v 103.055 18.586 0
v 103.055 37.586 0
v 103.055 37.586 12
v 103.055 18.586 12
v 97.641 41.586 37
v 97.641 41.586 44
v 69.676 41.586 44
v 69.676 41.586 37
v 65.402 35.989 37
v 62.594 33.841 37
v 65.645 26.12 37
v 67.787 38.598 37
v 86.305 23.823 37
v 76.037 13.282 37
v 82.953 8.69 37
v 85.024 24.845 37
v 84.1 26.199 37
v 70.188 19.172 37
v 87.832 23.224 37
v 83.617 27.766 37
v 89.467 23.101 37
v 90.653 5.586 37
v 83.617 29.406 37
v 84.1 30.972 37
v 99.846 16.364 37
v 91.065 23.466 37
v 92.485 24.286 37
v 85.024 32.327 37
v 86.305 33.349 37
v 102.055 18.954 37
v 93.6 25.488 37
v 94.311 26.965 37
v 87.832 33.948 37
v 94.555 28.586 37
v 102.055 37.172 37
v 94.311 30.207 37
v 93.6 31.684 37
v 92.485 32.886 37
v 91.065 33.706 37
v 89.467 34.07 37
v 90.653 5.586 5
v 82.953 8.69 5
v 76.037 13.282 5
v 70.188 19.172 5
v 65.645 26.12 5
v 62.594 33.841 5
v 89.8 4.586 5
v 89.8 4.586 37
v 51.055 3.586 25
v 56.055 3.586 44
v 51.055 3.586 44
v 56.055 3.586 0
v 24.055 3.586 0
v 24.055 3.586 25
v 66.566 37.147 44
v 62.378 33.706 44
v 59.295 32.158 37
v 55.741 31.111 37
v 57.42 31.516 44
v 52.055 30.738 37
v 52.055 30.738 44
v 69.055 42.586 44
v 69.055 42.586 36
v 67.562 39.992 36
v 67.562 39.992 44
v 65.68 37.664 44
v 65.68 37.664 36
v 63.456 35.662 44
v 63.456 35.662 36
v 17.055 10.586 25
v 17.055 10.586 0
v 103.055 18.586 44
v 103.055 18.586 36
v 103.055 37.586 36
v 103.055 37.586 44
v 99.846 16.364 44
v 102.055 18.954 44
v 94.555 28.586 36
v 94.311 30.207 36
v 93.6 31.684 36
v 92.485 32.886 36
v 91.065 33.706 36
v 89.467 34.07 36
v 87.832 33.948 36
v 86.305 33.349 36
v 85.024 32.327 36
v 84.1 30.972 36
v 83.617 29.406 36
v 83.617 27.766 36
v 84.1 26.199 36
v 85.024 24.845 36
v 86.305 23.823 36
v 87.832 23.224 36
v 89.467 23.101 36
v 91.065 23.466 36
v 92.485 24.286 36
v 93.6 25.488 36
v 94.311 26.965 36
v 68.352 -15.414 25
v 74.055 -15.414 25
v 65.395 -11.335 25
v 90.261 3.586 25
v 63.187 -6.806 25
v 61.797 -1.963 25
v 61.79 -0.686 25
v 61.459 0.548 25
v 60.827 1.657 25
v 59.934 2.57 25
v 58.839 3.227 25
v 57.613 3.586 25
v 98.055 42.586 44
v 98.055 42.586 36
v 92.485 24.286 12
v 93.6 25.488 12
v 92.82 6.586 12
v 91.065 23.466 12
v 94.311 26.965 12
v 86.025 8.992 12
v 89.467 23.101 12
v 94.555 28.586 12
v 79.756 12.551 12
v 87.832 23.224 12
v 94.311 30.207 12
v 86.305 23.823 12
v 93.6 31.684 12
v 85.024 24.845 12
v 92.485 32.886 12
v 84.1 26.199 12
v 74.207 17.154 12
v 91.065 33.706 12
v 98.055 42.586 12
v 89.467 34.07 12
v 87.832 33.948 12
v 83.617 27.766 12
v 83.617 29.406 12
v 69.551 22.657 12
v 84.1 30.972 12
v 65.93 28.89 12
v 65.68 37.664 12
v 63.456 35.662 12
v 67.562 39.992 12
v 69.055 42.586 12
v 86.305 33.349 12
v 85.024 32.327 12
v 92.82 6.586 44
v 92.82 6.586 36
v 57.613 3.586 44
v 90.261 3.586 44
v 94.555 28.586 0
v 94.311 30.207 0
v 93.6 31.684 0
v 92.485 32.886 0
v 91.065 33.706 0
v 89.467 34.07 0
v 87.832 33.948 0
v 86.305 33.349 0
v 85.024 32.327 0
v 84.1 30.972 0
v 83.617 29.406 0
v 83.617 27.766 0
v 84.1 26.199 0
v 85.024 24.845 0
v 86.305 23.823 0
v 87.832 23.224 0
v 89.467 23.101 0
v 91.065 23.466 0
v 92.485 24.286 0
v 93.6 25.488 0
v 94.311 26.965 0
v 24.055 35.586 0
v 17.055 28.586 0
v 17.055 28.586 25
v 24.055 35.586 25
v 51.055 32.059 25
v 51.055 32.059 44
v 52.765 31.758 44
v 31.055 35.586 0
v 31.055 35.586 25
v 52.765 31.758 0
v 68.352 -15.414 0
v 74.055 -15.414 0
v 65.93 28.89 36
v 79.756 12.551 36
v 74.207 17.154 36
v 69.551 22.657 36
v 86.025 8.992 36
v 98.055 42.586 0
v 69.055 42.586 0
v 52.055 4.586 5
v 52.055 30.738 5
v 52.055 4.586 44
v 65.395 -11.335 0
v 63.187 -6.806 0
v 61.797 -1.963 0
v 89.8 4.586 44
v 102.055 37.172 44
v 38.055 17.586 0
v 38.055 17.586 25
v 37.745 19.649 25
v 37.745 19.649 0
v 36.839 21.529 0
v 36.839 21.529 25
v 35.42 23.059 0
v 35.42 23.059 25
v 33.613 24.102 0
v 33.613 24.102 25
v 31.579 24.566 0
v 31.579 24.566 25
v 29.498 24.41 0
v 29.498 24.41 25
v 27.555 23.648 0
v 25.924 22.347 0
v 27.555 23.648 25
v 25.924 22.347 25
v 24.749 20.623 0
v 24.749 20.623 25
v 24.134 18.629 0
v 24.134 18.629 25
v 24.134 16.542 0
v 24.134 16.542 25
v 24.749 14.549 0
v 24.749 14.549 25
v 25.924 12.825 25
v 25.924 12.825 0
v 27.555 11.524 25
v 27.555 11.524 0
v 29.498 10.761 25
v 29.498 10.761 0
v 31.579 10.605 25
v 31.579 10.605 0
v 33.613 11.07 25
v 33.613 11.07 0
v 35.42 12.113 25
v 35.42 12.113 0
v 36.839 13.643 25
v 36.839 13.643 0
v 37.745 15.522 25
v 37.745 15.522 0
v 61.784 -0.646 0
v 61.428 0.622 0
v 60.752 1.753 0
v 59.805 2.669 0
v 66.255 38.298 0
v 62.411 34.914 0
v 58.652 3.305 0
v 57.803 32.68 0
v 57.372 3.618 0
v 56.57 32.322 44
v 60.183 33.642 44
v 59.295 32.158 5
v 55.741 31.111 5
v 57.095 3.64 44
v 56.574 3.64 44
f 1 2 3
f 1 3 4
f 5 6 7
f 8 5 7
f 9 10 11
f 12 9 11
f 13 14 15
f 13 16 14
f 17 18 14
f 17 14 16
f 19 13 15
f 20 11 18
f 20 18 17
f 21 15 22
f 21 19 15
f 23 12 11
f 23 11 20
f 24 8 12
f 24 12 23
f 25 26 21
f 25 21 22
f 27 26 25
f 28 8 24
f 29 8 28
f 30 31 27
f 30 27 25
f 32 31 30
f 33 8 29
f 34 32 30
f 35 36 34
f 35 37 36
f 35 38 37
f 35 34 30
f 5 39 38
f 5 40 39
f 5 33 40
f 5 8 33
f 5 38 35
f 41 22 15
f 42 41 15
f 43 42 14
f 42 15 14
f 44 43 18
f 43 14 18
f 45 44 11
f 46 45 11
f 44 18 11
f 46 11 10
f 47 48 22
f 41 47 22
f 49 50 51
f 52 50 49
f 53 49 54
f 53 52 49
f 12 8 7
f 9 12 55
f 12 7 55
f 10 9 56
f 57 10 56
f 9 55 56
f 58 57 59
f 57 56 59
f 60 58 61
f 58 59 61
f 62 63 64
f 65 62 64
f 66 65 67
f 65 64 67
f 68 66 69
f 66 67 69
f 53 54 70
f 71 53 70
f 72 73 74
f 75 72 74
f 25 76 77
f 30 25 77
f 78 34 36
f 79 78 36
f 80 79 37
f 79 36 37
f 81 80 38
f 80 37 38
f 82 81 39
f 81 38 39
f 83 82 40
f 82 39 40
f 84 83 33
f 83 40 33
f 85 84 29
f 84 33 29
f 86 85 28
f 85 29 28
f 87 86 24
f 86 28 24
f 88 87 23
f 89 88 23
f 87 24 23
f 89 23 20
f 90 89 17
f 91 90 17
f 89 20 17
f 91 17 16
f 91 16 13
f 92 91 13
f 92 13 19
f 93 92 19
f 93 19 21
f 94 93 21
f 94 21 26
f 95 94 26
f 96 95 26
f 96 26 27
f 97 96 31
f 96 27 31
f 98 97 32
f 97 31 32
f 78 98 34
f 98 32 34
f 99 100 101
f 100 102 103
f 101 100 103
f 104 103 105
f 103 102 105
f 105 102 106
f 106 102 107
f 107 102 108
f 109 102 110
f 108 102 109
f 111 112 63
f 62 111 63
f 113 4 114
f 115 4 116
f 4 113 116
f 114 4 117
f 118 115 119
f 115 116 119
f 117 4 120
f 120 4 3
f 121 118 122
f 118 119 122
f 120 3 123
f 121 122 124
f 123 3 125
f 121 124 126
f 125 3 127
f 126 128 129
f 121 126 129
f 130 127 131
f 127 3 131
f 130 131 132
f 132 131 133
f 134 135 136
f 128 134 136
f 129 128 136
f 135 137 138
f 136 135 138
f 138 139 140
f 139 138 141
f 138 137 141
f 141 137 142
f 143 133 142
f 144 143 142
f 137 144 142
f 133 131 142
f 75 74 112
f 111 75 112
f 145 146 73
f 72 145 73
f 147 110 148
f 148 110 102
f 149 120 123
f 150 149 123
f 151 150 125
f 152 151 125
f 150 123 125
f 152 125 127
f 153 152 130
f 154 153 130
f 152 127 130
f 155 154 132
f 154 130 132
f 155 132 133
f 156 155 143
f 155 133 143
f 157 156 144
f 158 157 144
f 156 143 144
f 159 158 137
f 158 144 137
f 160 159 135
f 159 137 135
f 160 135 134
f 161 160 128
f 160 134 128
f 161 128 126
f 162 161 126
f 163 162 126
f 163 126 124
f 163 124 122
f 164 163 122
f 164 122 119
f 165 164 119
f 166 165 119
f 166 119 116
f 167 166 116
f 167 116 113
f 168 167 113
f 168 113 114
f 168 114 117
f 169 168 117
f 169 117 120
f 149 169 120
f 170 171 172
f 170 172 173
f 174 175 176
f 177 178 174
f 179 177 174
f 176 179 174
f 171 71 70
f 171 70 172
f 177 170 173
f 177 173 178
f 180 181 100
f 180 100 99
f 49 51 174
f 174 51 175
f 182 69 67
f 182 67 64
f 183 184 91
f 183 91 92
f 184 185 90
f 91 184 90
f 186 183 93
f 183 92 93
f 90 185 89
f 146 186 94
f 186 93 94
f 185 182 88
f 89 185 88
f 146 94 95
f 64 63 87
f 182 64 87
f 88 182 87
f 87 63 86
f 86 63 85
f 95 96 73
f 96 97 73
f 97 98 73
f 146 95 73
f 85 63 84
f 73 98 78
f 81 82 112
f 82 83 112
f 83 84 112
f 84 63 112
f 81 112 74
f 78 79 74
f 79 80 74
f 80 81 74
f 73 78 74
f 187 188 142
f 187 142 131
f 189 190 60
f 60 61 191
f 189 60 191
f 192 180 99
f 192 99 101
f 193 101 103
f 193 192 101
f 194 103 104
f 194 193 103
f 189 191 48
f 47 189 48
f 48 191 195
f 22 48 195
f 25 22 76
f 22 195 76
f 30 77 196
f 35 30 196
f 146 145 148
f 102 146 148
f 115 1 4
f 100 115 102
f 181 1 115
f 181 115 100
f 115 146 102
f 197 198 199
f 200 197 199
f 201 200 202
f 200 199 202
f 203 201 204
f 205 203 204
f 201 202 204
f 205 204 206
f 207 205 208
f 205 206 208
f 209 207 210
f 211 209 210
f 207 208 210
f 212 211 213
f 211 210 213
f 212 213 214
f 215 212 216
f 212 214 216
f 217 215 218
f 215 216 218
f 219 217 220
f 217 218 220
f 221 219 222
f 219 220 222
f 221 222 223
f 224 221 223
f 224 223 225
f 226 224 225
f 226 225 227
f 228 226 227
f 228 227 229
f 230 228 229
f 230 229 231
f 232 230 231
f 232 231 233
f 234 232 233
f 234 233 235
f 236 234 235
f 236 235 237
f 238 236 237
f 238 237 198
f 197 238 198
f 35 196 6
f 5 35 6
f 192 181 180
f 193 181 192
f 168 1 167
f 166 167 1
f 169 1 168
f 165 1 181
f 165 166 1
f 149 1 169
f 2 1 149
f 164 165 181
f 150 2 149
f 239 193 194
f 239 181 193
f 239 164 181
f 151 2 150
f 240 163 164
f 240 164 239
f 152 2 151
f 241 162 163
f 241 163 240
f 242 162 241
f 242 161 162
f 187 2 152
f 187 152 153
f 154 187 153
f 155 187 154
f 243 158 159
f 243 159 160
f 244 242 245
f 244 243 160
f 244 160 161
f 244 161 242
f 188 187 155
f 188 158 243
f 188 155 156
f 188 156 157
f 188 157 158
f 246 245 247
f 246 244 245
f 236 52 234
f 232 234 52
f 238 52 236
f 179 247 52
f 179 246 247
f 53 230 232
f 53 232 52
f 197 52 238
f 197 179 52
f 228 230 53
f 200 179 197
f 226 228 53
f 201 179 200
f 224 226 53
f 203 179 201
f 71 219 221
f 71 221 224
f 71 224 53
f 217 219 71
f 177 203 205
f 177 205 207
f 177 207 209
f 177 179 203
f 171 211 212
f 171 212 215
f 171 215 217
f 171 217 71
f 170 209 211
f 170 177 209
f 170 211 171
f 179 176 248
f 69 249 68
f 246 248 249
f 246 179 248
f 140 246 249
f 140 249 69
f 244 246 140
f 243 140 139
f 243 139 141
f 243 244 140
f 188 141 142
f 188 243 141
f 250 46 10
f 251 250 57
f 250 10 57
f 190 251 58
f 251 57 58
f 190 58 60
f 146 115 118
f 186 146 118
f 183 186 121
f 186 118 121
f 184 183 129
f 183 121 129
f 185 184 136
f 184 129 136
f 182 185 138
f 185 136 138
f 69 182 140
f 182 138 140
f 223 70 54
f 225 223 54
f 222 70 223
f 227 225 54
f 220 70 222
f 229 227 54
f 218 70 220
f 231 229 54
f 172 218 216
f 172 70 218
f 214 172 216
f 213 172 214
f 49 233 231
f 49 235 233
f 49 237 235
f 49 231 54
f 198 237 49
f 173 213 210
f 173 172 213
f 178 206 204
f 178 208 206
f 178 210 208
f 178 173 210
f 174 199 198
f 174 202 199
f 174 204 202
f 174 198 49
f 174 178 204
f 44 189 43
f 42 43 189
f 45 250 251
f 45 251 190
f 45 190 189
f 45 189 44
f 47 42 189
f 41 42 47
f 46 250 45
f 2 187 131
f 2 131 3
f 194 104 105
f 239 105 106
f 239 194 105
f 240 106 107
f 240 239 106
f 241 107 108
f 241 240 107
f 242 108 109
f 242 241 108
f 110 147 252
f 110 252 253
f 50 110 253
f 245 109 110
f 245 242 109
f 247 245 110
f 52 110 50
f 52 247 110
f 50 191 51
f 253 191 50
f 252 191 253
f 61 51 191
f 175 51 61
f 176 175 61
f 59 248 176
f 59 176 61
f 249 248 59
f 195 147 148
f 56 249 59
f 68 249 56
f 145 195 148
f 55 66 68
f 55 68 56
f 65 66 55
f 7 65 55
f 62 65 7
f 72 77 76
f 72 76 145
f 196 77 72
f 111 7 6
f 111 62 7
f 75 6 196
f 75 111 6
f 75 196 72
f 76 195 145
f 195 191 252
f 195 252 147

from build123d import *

# Parameters (mm, degrees)
BOSS_EXTRU_1_DEPTH       = 44
ESQUISSE2_R              = 7
ENL_V_MAT_EXTRU_1_DEPTH  = 44
ENL_V_MAT_EXTRU_2_DEPTH  = 19
ESQUISSE4_R              = 5.5
ENL_V_MAT_EXTRU_3_DEPTH  = 50
ENL_V_START              = -19
ENL_V_MAT_EXTRU_5_DEPTH  = 19
ENL_V_START_2            = -32
ENL_V_MAT_EXTRU_8_DEPTH  = 32
BOSS_EXTRU_3_START       = -8
BOSS_EXTRU_3_DEPTH       = 8
ESQUISSE15_R             = 5.5
ENL_V_MAT_EXTRU_9_DEPTH  = 44
ENL_V_MAT_EXTRU_10_DEPTH = 7
ENL_V_MAT_EXTRU_11_DEPTH = 32


with BuildPart() as part:
    # Esquisse1 → Boss.-Extru.1 (new body)
    with BuildSketch(Plane.XY):
        with BuildLine():
            Line((69.055498862, 42.585779817), (98.055498862, 42.585779817))
            Line((98.055498862, 42.585779817), (103.055498862, 37.585779817))
            Line((103.055498862, 37.585779817), (103.055498862, 18.585779817))
            Line((103.055498862, 18.585779817), (74.055498862, -15.414220183))
            Line((74.055498862, -15.414220183), (68.352478915, -15.414220183))
            ThreePointArc((68.352478915, -15.414220183), (64.19229693, -9.118662105), (61.797161375, -1.962930743))
            ThreePointArc((61.797161375, -1.962930743), (60.309086392, 2.242265049), (56.055498862, 3.585779817))
            Line((56.055498862, 3.585779817), (24.055498862, 3.585779817))
            Line((24.055498862, 3.585779817), (17.055498862, 10.585779817))
            Line((17.055498862, 10.585779817), (17.055498862, 28.585779817))
            Line((17.055498862, 28.585779817), (24.055498862, 35.585779817))
            Line((24.055498862, 35.585779817), (31.055498862, 35.585779817))
            Line((31.055498862, 35.585779817), (52.765077496, 31.757795364))
            ThreePointArc((52.765077496, 31.757795364), (62.410764196, 34.914360395), (69.055498862, 42.585779817))
        make_face()
    extrude(amount=BOSS_EXTRU_1_DEPTH)

    # Esquisse2 → Enlèv. mat.-Extru.1 (cut)
    with BuildSketch(Plane.XY.offset(44)):
        with Locations((31.055498862, 17.585779817)):
            Circle(ESQUISSE2_R)
    extrude(amount=-ENL_V_MAT_EXTRU_1_DEPTH, mode=Mode.SUBTRACT)

    # Esquisse3 → Enlèv. mat.-Extru.2 (cut)
    with BuildSketch(Plane.XY.offset(44)):
        Polygon((17.055498862, 28.585779817), (17.055498862, 10.585779817), (24.055498862, 3.585779817), (51.055498862, 3.585779817), (51.055498862, 32.059240202), (31.055498862, 35.585779817), (24.055498862, 35.585779817), align=None)
    extrude(amount=-ENL_V_MAT_EXTRU_2_DEPTH, mode=Mode.SUBTRACT)

    # Esquisse4 → Enlèv. mat.-Extru.3 (cut)
    with BuildSketch(Plane.XY.offset(44)):
        with Locations((89.055498862, 28.585779817)):
            Circle(ESQUISSE4_R)
    extrude(amount=-ENL_V_MAT_EXTRU_3_DEPTH, mode=Mode.SUBTRACT)

    # Esquisse10 → Enlèv. mat.-Extru.5 (cut)
    with BuildSketch(Plane.XY.offset(44).offset(ENL_V_START)):
        with BuildLine():
            Line((56.055498862, 3.585779817), (90.261381215, 3.585779817))
            Line((90.261381215, 3.585779817), (74.055498862, -15.414220183))
            Line((74.055498862, -15.414220183), (68.352478915, -15.414220183))
            ThreePointArc((68.352478915, -15.414220183), (64.19229693, -9.118662105), (61.797161375, -1.962930743))
            ThreePointArc((61.797161375, -1.962930743), (60.047831429, 1.971925154), (56.055498862, 3.585779817))
        make_face()
    extrude(amount=ENL_V_MAT_EXTRU_5_DEPTH, mode=Mode.SUBTRACT)

    # Esquisse13 → Enlèv. mat.-Extru.8 (cut)
    with BuildSketch(Plane.XY.offset(44).offset(ENL_V_START_2)):
        with BuildLine():
            Line((69.055498862, 42.585779817), (98.055498862, 42.585779817))
            Line((98.055498862, 42.585779817), (103.055498862, 37.585779817))
            Line((103.055498862, 37.585779817), (103.055498862, 18.585779817))
            Line((103.055498862, 18.585779817), (92.820204745, 6.585779817))
            ThreePointArc((92.820204745, 6.585779817), (74.207332122, 17.1537679), (63.456424114, 35.661587231))
            ThreePointArc((63.456424114, 35.661587231), (66.667333439, 38.791037909), (69.055498862, 42.585779817))
        make_face()
    extrude(amount=ENL_V_MAT_EXTRU_8_DEPTH, mode=Mode.SUBTRACT)

    # Esquisse14 → Boss.-Extru.3 (add)
    with BuildSketch(Plane.XY.offset(44).offset(BOSS_EXTRU_3_START)):
        with BuildLine():
            Line((92.820204745, 6.585779817), (103.055498862, 18.585779817))
            Line((103.055498862, 18.585779817), (103.055498862, 37.585779817))
            Line((103.055498862, 37.585779817), (98.055498862, 42.585779817))
            Line((98.055498862, 42.585779817), (69.055498862, 42.585779817))
            ThreePointArc((69.055498862, 42.585779817), (66.667333439, 38.791037909), (63.456424114, 35.661587231))
            ThreePointArc((63.456424114, 35.661587231), (74.207332122, 17.1537679), (92.820204745, 6.585779817))
        make_face()
    extrude(amount=BOSS_EXTRU_3_DEPTH)

    # Esquisse15 → Enlèv. mat.-Extru.9 (cut)
    with BuildSketch(Plane.XY.offset(44)):
        with Locations((89.055498862, 28.585779817)):
            Circle(ESQUISSE15_R)
    extrude(amount=-ENL_V_MAT_EXTRU_9_DEPTH, mode=Mode.SUBTRACT)

    # Esquisse16 → Enlèv. mat.-Extru.10 (cut)
    with BuildSketch(Plane.XY.offset(44)):
        with BuildLine():
            Line((52.055498862, 30.738438438), (52.055498862, 5.694877453))
            Line((52.055498862, 5.694877453), (52.055498862, 4.585779817))
            Line((52.055498862, 4.585779817), (89.799975158, 4.585779817))
            Line((89.799975158, 4.585779817), (99.846475633, 16.364435546))
            Line((99.846475633, 16.364435546), (102.055498862, 18.954324849))
            Line((102.055498862, 18.954324849), (102.055498862, 19.210406558))
            Line((102.055498862, 19.210406558), (102.055498862, 37.171566254))
            Line((102.055498862, 37.171566254), (97.6412853, 41.585779817))
            Line((97.6412853, 41.585779817), (69.792651449, 41.585779817))
            Line((69.792651449, 41.585779817), (69.676351802, 41.585779817))
            ThreePointArc((69.676351802, 41.585779817), (62.377758595, 33.70622702), (52.055498862, 30.738438438))
        make_face()
    extrude(amount=-ENL_V_MAT_EXTRU_10_DEPTH, mode=Mode.SUBTRACT)

    # Esquisse17 → Enlèv. mat.-Extru.11 (cut)
    with BuildSketch(Plane.XY.offset(37)):
        with BuildLine():
            ThreePointArc((62.594221181, 33.84139262), (57.542094296, 31.552111629), (52.055498862, 30.738438438))
            Line((52.055498862, 30.738438438), (52.055498862, 4.585779817))
            Line((52.055498862, 4.585779817), (89.799975158, 4.585779817))
            Line((89.799975158, 4.585779817), (90.652916335, 5.585779817))
            ThreePointArc((90.652916335, 5.585779817), (72.962922789, 16.078451846), (62.594221181, 33.84139262))
        make_face()
    extrude(amount=-ENL_V_MAT_EXTRU_11_DEPTH, mode=Mode.SUBTRACT)


solid = part.part
